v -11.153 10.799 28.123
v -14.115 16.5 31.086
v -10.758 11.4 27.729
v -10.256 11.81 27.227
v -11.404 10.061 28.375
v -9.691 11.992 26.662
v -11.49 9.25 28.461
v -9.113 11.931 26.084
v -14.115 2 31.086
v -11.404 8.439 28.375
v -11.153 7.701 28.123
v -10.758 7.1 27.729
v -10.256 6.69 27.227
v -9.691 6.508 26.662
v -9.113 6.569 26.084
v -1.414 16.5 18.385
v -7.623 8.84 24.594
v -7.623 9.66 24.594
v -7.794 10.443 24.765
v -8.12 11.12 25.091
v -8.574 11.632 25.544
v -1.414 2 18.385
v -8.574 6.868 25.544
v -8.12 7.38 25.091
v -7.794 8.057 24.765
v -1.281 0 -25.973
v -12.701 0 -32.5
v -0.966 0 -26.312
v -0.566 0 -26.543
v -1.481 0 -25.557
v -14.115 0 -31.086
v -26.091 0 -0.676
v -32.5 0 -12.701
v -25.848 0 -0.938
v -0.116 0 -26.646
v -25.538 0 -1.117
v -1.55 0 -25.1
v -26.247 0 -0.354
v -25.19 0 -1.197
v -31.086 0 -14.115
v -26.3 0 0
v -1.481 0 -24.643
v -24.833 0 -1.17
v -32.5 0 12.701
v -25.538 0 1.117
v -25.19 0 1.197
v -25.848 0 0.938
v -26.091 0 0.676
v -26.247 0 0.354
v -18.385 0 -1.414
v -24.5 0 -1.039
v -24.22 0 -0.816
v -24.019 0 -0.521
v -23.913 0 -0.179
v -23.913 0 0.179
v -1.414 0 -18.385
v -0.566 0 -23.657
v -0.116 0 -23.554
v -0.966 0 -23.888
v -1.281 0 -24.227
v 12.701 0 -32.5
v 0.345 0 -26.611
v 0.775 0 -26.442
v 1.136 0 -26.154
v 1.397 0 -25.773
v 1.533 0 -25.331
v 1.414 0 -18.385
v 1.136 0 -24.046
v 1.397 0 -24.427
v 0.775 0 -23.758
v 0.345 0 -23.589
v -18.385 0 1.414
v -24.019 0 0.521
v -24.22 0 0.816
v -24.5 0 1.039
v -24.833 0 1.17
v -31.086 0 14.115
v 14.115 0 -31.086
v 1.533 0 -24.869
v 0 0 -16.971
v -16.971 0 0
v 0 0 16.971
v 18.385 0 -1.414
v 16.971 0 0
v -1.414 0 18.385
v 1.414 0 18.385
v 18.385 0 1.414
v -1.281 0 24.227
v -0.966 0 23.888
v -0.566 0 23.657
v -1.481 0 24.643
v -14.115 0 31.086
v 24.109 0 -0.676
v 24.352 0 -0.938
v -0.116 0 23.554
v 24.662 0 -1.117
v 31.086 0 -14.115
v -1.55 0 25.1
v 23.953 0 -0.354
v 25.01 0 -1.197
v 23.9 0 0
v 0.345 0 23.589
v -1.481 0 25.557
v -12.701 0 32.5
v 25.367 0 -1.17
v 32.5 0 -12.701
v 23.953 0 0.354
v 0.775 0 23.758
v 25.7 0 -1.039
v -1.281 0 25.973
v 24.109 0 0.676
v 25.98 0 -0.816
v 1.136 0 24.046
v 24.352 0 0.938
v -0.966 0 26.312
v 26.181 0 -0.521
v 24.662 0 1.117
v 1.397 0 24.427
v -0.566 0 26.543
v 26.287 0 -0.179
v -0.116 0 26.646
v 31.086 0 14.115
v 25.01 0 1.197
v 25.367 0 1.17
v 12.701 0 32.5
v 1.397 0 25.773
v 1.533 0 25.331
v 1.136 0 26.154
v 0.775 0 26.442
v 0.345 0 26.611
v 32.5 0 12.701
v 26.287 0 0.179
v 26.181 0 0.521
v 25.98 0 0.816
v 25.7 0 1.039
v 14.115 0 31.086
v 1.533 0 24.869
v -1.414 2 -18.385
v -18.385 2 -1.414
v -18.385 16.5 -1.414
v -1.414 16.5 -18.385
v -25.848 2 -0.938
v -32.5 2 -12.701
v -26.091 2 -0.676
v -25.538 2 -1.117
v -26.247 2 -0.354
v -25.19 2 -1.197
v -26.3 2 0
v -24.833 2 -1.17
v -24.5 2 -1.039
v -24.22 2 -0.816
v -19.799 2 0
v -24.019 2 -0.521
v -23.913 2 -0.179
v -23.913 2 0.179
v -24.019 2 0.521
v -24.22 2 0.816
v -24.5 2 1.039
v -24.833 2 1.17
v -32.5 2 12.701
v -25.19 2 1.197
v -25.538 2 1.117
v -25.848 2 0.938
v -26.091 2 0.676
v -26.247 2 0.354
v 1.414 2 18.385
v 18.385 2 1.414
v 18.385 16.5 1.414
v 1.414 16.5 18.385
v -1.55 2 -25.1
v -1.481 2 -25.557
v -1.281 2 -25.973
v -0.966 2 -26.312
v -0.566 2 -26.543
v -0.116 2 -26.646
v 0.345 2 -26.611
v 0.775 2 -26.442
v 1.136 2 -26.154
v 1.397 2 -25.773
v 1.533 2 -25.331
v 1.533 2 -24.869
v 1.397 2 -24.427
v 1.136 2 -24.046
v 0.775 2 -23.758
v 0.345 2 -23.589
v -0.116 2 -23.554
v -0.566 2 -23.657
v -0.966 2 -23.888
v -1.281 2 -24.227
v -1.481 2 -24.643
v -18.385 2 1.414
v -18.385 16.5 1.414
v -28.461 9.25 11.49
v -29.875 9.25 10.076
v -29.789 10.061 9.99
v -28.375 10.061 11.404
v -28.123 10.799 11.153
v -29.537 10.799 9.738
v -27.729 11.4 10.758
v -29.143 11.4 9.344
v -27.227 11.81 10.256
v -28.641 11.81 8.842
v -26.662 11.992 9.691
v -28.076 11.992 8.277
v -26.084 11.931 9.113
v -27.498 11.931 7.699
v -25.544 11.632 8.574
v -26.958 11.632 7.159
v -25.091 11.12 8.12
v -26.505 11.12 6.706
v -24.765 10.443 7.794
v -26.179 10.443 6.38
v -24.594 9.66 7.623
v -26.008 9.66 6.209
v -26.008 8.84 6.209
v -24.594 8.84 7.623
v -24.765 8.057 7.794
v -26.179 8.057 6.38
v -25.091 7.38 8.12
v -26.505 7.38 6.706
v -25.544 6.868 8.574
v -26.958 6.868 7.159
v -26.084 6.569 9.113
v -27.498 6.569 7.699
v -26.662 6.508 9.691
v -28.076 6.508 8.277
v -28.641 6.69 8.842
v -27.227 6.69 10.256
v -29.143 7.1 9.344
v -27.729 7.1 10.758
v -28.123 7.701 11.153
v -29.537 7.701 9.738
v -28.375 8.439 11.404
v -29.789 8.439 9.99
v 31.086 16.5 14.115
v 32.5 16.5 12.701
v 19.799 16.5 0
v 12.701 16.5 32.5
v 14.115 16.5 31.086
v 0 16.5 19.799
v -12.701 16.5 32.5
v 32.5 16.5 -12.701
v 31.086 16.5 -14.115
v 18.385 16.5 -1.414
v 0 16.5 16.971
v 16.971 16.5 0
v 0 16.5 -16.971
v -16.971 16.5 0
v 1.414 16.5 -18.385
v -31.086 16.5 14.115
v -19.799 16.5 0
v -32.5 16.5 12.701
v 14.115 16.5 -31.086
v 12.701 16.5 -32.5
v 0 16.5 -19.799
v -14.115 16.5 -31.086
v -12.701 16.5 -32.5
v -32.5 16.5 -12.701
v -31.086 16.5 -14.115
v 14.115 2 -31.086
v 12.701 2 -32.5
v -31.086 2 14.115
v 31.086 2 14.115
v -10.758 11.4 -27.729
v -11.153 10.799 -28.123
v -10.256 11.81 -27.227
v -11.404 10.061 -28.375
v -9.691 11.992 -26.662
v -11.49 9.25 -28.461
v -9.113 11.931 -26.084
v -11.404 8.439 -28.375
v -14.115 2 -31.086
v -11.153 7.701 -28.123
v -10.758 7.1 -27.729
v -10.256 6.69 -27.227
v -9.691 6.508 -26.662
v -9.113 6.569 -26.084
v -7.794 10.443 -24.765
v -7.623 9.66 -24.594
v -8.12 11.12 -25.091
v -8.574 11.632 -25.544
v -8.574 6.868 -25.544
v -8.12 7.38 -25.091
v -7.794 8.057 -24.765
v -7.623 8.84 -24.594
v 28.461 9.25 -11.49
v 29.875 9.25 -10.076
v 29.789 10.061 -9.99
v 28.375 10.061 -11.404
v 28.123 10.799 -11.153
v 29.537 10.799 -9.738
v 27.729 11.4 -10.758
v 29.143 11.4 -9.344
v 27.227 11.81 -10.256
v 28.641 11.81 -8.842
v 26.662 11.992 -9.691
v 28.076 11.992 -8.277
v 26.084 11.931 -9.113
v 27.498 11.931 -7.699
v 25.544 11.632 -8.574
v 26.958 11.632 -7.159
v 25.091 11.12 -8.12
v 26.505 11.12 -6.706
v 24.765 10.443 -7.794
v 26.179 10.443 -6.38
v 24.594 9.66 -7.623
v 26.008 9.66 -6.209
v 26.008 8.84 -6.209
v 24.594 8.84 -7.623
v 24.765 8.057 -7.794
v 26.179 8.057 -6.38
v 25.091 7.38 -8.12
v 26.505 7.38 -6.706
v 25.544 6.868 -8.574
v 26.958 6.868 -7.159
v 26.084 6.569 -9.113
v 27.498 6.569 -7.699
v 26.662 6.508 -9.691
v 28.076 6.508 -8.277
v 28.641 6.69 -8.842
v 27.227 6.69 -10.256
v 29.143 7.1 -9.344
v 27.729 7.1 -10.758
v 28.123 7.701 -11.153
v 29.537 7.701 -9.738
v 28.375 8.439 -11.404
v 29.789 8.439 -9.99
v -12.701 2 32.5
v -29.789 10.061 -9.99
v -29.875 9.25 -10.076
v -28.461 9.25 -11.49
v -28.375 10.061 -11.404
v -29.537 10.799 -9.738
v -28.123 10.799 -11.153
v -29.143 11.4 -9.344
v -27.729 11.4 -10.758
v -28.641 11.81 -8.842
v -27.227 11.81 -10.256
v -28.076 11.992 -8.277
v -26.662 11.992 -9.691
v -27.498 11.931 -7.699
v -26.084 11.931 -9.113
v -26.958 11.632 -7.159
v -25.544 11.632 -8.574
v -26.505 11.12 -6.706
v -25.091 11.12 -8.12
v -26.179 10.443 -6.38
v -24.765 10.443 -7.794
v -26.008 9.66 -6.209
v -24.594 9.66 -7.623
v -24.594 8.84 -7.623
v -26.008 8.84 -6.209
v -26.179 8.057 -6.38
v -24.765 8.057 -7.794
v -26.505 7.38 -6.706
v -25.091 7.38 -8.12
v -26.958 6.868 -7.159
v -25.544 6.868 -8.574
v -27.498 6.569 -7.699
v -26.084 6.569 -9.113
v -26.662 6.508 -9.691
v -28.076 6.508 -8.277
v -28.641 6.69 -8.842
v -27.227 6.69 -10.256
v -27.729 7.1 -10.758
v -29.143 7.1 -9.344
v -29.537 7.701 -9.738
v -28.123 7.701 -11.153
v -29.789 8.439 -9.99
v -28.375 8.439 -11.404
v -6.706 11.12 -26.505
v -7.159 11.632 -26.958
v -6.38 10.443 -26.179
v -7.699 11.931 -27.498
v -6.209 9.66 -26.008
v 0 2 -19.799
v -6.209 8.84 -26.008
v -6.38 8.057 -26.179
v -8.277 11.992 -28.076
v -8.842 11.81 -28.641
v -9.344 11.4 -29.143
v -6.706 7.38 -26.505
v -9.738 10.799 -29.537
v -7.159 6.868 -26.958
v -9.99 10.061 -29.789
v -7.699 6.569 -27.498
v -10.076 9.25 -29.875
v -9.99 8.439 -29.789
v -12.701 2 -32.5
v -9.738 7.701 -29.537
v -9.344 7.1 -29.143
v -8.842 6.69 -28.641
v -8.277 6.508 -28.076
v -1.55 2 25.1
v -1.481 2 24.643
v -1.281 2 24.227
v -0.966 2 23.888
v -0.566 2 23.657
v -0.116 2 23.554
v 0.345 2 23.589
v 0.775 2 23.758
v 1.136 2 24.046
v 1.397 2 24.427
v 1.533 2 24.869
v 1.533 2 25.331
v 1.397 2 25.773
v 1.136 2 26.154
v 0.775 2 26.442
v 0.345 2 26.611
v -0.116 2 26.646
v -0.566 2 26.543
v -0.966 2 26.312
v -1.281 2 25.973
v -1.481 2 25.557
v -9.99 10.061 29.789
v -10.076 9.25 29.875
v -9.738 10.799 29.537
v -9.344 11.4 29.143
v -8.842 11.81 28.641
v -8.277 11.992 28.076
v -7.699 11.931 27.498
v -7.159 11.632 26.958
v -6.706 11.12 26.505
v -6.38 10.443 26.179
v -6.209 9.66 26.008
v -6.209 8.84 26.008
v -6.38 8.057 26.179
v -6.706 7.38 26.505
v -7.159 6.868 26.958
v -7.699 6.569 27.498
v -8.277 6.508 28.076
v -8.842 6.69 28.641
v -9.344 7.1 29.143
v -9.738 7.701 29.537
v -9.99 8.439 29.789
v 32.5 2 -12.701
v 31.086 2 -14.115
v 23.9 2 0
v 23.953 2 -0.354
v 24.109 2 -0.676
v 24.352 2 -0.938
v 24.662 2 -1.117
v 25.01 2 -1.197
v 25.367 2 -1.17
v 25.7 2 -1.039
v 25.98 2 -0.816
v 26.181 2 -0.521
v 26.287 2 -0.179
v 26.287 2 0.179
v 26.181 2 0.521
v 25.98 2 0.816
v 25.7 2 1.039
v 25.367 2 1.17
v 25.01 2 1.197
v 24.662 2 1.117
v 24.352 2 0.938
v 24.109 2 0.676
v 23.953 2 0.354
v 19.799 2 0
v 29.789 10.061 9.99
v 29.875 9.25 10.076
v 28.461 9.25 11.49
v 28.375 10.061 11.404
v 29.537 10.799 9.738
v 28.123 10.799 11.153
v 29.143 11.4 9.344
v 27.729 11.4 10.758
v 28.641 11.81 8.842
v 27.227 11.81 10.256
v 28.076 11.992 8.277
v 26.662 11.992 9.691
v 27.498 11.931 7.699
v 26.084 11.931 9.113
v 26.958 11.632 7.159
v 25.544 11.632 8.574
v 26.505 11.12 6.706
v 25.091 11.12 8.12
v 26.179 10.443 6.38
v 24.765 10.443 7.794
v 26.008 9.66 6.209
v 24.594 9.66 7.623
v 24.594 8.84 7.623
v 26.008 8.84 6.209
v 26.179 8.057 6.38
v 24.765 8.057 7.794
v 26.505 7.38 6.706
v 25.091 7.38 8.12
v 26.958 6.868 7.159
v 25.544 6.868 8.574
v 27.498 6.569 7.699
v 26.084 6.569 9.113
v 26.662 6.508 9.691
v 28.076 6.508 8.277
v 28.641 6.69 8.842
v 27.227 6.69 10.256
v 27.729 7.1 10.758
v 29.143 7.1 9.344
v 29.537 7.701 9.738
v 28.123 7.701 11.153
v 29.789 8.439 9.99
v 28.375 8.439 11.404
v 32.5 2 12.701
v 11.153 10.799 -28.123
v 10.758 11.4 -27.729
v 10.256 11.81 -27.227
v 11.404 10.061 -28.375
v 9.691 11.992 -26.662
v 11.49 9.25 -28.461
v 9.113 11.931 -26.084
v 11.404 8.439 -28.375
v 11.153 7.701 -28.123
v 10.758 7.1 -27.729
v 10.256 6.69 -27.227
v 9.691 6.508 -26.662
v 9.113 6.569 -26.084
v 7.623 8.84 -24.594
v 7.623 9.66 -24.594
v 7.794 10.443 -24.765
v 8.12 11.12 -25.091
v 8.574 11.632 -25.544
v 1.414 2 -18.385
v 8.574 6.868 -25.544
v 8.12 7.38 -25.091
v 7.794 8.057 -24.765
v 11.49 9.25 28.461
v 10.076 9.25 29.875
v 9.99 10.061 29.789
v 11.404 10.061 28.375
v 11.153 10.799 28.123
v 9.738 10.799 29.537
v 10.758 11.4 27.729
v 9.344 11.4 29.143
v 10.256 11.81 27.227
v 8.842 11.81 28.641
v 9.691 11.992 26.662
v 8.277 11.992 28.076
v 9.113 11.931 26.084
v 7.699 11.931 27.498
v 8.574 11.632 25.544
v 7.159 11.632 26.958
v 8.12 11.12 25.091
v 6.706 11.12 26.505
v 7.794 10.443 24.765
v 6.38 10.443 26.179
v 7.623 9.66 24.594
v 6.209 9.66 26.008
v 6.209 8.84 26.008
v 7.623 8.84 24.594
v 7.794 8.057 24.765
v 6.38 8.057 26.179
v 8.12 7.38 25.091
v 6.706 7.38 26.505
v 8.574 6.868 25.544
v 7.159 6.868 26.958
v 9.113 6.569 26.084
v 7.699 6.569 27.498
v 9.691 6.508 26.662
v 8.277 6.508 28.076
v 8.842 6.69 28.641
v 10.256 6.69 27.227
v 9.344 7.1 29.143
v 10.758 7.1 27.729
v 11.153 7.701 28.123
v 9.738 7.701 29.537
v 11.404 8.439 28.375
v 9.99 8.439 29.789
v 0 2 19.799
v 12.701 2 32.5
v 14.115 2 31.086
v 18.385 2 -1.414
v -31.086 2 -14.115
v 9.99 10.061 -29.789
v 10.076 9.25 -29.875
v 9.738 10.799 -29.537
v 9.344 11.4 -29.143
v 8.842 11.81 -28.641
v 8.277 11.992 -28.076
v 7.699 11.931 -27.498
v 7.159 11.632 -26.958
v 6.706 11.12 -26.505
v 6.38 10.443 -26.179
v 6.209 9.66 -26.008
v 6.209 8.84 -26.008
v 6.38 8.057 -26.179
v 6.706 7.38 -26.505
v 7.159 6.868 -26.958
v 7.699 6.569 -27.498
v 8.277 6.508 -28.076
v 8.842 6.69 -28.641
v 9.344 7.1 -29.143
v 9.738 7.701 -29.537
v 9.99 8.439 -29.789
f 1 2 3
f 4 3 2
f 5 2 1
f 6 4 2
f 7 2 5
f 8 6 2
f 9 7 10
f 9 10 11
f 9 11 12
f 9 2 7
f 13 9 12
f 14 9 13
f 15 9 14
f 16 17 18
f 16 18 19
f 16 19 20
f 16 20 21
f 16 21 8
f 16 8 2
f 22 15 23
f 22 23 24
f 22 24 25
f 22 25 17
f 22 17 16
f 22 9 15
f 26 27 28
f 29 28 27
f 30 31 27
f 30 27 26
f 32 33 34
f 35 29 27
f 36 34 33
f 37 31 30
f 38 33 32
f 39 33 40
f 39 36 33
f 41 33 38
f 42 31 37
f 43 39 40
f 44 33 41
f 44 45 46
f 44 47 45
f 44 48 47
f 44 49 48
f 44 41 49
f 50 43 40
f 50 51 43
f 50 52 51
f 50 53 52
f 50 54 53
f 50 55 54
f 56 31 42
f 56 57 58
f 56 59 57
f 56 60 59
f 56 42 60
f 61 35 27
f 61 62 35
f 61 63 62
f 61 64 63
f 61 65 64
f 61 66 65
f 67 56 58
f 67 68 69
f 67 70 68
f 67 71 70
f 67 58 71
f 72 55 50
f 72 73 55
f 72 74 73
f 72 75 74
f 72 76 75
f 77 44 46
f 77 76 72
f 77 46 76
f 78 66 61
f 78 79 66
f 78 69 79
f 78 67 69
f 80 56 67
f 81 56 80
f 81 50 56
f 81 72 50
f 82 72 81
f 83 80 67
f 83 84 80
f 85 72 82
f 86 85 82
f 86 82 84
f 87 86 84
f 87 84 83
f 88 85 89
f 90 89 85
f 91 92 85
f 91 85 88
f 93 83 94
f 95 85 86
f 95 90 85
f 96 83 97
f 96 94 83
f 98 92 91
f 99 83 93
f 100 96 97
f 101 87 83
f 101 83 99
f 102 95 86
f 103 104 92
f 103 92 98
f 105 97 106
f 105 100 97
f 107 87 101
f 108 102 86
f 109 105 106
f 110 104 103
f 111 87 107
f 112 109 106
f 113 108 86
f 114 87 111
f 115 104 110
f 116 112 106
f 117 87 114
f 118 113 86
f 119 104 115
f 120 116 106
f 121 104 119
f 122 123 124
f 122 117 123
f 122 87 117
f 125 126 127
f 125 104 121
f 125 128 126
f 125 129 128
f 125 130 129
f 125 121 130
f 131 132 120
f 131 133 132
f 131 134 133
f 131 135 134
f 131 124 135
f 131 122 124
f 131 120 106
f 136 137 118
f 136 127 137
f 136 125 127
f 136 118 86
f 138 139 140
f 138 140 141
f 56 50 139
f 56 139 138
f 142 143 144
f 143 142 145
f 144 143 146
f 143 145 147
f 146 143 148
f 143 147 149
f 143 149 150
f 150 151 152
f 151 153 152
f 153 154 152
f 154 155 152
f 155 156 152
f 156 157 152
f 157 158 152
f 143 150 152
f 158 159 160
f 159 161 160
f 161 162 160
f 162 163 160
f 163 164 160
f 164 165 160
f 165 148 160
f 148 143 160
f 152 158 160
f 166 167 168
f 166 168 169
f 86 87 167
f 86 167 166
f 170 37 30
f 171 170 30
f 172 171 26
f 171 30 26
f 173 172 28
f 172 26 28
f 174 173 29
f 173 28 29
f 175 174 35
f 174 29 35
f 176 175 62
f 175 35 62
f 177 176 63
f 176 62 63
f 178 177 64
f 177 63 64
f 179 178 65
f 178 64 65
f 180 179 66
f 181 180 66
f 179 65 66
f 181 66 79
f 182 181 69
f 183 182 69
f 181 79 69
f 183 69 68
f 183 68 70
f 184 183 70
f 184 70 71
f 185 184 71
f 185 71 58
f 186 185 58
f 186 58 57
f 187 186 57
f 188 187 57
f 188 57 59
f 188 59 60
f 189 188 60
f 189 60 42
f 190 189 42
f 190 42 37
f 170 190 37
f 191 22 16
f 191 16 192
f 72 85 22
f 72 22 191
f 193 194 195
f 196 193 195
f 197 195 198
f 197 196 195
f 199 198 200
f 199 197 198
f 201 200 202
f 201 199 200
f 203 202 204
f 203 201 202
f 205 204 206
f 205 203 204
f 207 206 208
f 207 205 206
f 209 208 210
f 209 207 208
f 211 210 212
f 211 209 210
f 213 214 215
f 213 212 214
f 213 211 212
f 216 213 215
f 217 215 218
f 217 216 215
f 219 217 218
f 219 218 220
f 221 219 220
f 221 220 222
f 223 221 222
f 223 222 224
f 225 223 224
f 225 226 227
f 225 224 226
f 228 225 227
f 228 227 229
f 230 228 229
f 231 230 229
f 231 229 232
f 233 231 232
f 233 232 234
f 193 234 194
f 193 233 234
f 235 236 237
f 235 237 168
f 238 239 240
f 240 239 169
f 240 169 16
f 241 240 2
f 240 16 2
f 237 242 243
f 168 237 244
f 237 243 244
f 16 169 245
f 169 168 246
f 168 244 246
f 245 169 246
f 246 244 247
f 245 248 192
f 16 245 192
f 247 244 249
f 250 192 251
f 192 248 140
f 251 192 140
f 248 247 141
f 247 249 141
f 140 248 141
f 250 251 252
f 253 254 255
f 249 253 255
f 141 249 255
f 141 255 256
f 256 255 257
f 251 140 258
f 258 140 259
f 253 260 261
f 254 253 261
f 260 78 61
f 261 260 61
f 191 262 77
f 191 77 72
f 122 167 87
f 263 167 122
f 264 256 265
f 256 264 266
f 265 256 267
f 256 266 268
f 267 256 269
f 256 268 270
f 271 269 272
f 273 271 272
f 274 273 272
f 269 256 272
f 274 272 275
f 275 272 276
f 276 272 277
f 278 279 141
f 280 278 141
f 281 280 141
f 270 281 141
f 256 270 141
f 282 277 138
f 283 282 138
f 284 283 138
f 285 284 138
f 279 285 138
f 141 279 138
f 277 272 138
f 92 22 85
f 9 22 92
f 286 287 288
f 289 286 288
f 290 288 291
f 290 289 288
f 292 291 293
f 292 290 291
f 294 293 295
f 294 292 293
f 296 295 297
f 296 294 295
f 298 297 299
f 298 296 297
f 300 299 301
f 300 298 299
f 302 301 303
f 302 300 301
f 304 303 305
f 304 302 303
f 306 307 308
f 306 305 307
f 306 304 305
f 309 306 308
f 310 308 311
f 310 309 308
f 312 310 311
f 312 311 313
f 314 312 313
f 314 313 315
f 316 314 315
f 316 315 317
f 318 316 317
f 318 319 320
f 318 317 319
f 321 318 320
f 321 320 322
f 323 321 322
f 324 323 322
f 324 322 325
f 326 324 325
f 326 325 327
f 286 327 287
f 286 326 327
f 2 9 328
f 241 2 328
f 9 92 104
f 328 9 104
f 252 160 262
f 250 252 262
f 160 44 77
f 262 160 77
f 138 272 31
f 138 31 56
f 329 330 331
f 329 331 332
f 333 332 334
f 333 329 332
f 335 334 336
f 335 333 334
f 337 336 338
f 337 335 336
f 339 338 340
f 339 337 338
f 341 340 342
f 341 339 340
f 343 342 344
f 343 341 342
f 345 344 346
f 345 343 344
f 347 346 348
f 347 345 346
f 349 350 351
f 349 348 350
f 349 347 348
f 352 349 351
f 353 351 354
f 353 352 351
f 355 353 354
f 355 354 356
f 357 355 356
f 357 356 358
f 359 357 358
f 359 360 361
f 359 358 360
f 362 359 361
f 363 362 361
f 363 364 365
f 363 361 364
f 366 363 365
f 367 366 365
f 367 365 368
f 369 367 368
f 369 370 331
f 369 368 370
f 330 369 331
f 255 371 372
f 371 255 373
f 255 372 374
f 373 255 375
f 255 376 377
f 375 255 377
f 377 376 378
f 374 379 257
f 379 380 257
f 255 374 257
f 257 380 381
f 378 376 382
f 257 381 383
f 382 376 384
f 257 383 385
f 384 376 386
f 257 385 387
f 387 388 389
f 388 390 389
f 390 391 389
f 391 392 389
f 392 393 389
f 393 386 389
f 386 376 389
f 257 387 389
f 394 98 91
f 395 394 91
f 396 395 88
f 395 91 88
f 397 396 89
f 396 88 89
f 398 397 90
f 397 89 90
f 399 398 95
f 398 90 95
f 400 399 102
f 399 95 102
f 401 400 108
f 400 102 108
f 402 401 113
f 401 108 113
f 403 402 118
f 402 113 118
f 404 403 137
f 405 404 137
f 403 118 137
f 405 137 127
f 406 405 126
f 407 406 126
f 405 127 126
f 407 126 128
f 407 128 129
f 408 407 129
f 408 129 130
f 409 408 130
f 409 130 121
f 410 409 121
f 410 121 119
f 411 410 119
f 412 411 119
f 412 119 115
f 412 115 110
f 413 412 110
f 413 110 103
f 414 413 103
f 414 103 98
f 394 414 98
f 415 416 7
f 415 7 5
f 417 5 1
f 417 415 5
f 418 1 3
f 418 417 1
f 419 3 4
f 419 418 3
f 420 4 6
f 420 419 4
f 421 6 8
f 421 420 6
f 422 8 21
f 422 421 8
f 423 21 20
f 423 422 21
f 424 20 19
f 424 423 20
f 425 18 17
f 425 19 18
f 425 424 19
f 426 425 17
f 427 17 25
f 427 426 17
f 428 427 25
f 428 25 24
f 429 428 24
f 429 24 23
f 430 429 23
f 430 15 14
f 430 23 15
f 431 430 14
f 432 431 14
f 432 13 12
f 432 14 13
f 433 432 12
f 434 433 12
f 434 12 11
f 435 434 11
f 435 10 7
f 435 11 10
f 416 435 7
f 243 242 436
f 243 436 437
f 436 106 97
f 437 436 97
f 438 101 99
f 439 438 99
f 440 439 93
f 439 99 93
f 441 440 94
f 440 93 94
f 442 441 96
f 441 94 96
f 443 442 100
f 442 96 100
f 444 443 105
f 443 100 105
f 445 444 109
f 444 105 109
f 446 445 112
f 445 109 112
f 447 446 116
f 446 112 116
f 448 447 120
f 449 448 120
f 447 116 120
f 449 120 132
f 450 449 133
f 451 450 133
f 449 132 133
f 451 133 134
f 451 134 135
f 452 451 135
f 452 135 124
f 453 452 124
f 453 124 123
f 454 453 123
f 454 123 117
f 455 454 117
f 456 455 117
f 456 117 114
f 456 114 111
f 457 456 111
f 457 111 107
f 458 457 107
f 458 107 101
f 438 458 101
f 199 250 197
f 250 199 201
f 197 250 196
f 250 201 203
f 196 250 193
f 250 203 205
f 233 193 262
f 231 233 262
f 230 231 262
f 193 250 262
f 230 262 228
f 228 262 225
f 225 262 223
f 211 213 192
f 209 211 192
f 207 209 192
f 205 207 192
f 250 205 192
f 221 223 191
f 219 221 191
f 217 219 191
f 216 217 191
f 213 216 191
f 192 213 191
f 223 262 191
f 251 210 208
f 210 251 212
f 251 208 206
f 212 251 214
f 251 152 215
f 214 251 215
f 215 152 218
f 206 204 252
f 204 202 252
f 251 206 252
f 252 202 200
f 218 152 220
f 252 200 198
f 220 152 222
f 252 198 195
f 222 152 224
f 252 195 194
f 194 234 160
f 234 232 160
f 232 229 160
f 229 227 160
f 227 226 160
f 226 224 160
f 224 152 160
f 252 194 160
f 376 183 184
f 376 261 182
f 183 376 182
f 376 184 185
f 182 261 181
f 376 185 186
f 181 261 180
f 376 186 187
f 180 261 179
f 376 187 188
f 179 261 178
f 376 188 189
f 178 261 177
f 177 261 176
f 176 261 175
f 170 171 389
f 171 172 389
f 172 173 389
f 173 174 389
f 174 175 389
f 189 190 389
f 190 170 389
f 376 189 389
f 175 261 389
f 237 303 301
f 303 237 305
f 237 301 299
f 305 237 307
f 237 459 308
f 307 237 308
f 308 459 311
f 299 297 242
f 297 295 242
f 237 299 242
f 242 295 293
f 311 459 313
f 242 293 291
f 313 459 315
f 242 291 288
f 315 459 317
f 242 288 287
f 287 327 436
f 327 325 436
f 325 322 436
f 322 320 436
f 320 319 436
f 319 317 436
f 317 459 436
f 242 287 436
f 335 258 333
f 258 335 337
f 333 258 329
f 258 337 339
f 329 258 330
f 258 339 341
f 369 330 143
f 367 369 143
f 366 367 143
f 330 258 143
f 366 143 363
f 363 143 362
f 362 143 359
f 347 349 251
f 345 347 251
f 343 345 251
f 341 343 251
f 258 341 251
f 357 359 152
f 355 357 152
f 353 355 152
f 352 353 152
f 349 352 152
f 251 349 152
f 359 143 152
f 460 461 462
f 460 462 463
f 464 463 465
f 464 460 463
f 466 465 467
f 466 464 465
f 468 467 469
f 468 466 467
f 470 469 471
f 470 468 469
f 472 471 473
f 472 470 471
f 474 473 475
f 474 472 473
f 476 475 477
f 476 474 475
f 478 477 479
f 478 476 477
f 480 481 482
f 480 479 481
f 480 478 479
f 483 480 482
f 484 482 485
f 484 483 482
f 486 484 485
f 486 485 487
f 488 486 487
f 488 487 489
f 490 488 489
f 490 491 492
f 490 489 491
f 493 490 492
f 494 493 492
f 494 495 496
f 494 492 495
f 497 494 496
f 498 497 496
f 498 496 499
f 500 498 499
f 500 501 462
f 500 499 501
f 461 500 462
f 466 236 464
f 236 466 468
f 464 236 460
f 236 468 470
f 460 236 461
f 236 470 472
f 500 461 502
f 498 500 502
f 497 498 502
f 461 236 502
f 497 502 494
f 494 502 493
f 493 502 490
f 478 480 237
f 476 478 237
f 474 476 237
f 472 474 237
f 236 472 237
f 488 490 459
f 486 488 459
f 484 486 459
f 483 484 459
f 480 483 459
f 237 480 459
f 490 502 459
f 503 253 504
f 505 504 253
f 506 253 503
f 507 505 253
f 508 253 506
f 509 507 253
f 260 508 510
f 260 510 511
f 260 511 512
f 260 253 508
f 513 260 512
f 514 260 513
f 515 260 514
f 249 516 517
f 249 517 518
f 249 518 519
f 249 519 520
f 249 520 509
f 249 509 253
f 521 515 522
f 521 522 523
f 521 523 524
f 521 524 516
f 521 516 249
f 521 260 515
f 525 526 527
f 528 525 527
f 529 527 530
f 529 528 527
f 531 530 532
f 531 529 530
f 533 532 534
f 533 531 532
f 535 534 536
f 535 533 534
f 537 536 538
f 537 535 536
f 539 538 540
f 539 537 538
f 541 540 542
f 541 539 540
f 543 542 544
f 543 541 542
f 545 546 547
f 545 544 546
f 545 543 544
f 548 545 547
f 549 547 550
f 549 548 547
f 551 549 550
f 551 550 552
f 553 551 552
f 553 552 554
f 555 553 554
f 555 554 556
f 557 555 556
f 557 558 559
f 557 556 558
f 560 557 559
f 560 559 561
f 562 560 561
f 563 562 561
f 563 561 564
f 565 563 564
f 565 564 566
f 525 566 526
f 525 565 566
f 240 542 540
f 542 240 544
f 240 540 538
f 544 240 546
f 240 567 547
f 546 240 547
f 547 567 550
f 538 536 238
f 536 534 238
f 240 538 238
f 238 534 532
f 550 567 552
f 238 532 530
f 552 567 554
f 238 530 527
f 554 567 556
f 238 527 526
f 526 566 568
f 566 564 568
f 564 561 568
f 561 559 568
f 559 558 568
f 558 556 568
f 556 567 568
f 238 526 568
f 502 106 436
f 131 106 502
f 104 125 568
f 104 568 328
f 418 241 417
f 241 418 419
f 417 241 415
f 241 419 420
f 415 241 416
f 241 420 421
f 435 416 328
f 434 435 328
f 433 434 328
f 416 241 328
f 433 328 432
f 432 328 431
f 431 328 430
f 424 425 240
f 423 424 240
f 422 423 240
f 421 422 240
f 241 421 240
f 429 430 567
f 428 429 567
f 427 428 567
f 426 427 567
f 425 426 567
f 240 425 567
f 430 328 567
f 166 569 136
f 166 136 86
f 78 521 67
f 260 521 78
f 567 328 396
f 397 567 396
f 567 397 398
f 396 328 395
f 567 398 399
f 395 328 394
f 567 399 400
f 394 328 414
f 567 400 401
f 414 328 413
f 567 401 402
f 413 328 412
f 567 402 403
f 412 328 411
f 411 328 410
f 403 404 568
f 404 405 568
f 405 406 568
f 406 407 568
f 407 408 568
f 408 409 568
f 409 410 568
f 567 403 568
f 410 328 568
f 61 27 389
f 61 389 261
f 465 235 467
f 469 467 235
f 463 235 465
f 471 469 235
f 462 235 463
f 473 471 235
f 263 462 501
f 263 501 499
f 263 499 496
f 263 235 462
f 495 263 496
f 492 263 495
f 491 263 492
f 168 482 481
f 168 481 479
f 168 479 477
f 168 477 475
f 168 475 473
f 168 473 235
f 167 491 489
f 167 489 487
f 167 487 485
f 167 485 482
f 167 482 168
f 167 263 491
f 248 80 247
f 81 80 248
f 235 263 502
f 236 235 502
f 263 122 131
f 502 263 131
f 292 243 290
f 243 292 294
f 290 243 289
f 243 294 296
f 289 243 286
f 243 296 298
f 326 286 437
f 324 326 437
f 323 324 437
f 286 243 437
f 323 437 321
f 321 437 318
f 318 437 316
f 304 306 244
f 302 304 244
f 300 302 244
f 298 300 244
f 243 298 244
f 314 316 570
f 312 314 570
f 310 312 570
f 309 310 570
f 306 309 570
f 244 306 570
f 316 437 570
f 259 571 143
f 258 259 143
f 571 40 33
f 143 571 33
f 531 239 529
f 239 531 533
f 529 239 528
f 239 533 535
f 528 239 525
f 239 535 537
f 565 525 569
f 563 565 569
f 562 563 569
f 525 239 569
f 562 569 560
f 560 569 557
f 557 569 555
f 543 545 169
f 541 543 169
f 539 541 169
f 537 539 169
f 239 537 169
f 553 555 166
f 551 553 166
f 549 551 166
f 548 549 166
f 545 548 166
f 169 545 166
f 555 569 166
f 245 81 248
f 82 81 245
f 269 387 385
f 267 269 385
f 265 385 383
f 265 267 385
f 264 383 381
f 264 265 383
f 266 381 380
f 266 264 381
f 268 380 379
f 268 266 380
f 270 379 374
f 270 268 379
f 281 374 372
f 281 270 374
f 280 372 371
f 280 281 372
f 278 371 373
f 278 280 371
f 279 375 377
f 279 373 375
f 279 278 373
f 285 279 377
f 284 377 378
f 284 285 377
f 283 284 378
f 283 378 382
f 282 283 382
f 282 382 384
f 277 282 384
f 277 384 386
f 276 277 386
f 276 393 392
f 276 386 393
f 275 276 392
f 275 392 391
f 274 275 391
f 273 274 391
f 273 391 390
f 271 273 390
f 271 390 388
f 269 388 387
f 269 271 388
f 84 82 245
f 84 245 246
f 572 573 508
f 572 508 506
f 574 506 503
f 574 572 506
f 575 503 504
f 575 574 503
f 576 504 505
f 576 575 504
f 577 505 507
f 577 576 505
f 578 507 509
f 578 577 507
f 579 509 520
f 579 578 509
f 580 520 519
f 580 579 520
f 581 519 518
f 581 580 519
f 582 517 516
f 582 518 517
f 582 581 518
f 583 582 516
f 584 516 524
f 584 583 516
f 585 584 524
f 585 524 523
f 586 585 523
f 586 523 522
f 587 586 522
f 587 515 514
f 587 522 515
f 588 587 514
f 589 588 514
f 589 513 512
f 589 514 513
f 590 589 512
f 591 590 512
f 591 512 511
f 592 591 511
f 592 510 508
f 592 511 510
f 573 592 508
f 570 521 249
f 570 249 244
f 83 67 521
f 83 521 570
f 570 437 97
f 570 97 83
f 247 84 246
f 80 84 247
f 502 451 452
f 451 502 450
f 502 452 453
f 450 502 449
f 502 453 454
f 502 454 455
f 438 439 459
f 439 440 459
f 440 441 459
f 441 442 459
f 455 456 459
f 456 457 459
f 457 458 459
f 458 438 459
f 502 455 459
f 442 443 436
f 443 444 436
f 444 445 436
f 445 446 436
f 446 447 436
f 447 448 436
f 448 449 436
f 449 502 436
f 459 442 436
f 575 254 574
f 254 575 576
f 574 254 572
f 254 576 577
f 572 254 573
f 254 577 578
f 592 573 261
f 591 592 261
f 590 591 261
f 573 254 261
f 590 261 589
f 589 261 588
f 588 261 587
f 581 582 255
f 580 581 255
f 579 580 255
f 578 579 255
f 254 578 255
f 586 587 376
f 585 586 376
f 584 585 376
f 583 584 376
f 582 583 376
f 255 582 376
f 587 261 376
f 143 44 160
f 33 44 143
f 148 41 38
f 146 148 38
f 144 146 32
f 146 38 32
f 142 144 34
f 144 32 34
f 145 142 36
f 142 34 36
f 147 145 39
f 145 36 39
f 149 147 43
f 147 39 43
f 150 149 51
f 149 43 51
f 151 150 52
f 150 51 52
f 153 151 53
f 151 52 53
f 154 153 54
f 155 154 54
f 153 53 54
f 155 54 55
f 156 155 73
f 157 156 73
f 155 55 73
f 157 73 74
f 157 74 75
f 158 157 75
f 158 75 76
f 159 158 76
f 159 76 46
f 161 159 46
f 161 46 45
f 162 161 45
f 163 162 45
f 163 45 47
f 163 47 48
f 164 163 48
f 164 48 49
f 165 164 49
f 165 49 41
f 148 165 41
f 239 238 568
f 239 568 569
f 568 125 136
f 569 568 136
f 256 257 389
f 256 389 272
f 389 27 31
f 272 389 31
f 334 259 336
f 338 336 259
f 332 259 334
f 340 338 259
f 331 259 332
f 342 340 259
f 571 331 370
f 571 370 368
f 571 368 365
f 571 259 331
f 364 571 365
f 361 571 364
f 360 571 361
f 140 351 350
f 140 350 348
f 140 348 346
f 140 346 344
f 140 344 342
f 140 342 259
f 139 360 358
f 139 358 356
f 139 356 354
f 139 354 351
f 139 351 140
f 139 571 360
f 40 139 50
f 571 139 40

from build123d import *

# Parameters (mm, degrees)
GENERAL_SHAPE_DEPTH             = 2
RETAINING_WALLS_DEPTH           = 14.5
EXTERIOR_MOUNTING_EDGE_DEPTH    = 2
REAR_WALL_DEPTH                 = 14.5
CUT_EXTRUDE2_DEPTH              = 51.801082666
CUT_EXTRUDE2_DEPTH_BACK         = 51.801082666
SKETCH35_R                      = 2.75
CIRPATTERN2_COUNT               = 4
EXTERIOR_MOUNTING_HOLE_D        = 2.4
SHOULDER_SCREW_MOUNTING_HOLES_D = 3.1
CUT_EXTRUDE1_REACH              = 50.195


with BuildPart() as part:
    # Sketch3 → General shape (new body)
    with BuildSketch(Plane(origin=(0, 0, 0), x_dir=(1, 0, 0), z_dir=(0, 1, 0))):
        Polygon((-32.5, -12.701010127), (-12.701010127, -32.5), (0, -19.798989873), (0, 0), (-19.798989873, 0), align=None)
    extrude(amount=GENERAL_SHAPE_DEPTH)

    # Sketch4 → Retaining walls (add)
    with BuildSketch(Plane(origin=(0, 2, 0), x_dir=(1, 0, 0), z_dir=(0, 1, 0))):
        Polygon((-19.798989873, 0), (-32.5, -12.701010127), (-31.085786438, -14.115223689), (-16.970562748, 0), align=None)
        Polygon((-14.115223689, -31.085786438), (0, -16.970562748), (0, -19.798989873), (-12.701010127, -32.5), align=None)
    extrude(amount=RETAINING_WALLS_DEPTH)

    # Sketch14 → Exterior mounting edge (add)
    with BuildSketch(Plane.XZ):
        Polygon((-19.798989873, 0), (-32.5, 12.701010127), (-32.5, 0), align=None)
        Polygon((0, 19.798989873), (0, 32.5), (-12.701010127, 32.5), align=None)
    extrude(amount=-EXTERIOR_MOUNTING_EDGE_DEPTH)

    # Sketch18 → Rear wall (add)
    with BuildSketch(Plane(origin=(0, 2, 0), x_dir=(1, 0, 0), z_dir=(0, 1, 0))):
        Polygon((-16.970562748, 0), (0, -16.970562748), (-1.414213562, -18.384776311), (-18.384776311, -1.414213562), align=None)
    extrude(amount=REAR_WALL_DEPTH)

    # Sketch35 → Cut-Extrude2 (cut, two sides: drawn at the far end of the back side and taken through both)
    with BuildSketch(Plane(origin=(-9.899494937, 0, -9.899494937), x_dir=(-0.7071067811865475, 0, 0.7071067811865477), z_dir=(-0.7071067811865477, 0, -0.7071067811865475)).offset(-CUT_EXTRUDE2_DEPTH_BACK)):
        with Locations((25.5, 9.25)):
            Circle(SKETCH35_R)
    extrude(amount=CUT_EXTRUDE2_DEPTH + CUT_EXTRUDE2_DEPTH_BACK, mode=Mode.SUBTRACT)


with BuildPart() as cirpattern2_1:
    # CirPattern2: pattern copy
    add(part.part.rotate(Axis((0, 0, 0), (0, 1, 0)), 1 * 360 / CIRPATTERN2_COUNT))


with BuildPart() as cirpattern2_2:
    # CirPattern2: pattern copy
    add(part.part.rotate(Axis((0, 0, 0), (0, 1, 0)), 2 * 360 / CIRPATTERN2_COUNT))


with BuildPart() as cirpattern2_3:
    # CirPattern2: pattern copy
    add(part.part.rotate(Axis((0, 0, 0), (0, 1, 0)), 3 * 360 / CIRPATTERN2_COUNT))

    # Combine1: union CirPattern2_1, CirPattern2_2, part
    add(cirpattern2_1.part)
    add(cirpattern2_2.part)
    add(part.part)

    # Exterior mounting hole (through all)
    with Locations(Plane(origin=(0, 2, 0), x_dir=(1, 0, 0), z_dir=(0, 1, 0))):
        with Locations((-25.1, 0), (25.1, 0)):
            Hole(EXTERIOR_MOUNTING_HOLE_D / 2)

    # Shoulder screw mounting holes (through all)
    with Locations(Plane(origin=(0, 2, 0), x_dir=(1, 0, 0), z_dir=(0, 1, 0))):
        with Locations((0, -25.1), (0, 25.1)):
            Hole(SHOULDER_SCREW_MOUNTING_HOLES_D / 2)

    # Sketch23 → Cut-Extrude1 (cut, up to next)
    with BuildSketch(Plane(origin=(0, 2, 0), x_dir=(1, 0, 0), z_dir=(0, 1, 0)), mode=Mode.PRIVATE) as cut_extrude1_sk1:
        Polygon((0, 16.970562748), (-16.970562748, 0), (0, -16.970562748), (16.970562748, 0), align=None)
    cut_extrude1_tool1 = extrude(cut_extrude1_sk1.sketch, amount=-CUT_EXTRUDE1_REACH, mode=Mode.PRIVATE) & cirpattern2_3.part
    # Sketch23 → Cut-Extrude1 (cut, up to next)
    with BuildSketch(Plane(origin=(0, 2, 0), x_dir=(1, 0, 0), z_dir=(0, 1, 0)), mode=Mode.PRIVATE) as cut_extrude1_sk2:
        Polygon((31.085786438, 14.115223689), (18.384776311, 1.414213562), (1.414213562, 18.384776311), (14.115223689, 31.085786438), align=None)
    cut_extrude1_tool2 = extrude(cut_extrude1_sk2.sketch, amount=-CUT_EXTRUDE1_REACH, mode=Mode.PRIVATE) & cirpattern2_3.part
    # Sketch23 → Cut-Extrude1 (cut, up to next)
    with BuildSketch(Plane(origin=(0, 2, 0), x_dir=(1, 0, 0), z_dir=(0, 1, 0)), mode=Mode.PRIVATE) as cut_extrude1_sk3:
        Polygon((-18.384776311, 1.414213562), (-31.085786438, 14.115223689), (-14.115223689, 31.085786438), (-1.414213562, 18.384776311), align=None)
    cut_extrude1_tool3 = extrude(cut_extrude1_sk3.sketch, amount=-CUT_EXTRUDE1_REACH, mode=Mode.PRIVATE) & cirpattern2_3.part
    # Sketch23 → Cut-Extrude1 (cut, up to next)
    with BuildSketch(Plane(origin=(0, 2, 0), x_dir=(1, 0, 0), z_dir=(0, 1, 0)), mode=Mode.PRIVATE) as cut_extrude1_sk4:
        Polygon((-1.414213562, -18.384776311), (-14.115223689, -31.085786438), (-31.085786438, -14.115223689), (-18.384776311, -1.414213562), align=None)
    cut_extrude1_tool4 = extrude(cut_extrude1_sk4.sketch, amount=-CUT_EXTRUDE1_REACH, mode=Mode.PRIVATE) & cirpattern2_3.part
    # Sketch23 → Cut-Extrude1 (cut, up to next)
    with BuildSketch(Plane(origin=(0, 2, 0), x_dir=(1, 0, 0), z_dir=(0, 1, 0)), mode=Mode.PRIVATE) as cut_extrude1_sk5:
        Polygon((14.115223689, -31.085786438), (1.414213562, -18.384776311), (18.384776311, -1.414213562), (31.085786438, -14.115223689), align=None)
    cut_extrude1_tool5 = extrude(cut_extrude1_sk5.sketch, amount=-CUT_EXTRUDE1_REACH, mode=Mode.PRIVATE) & cirpattern2_3.part
    add(cut_extrude1_tool1.solids().sort_by_distance((0, 2, 0))[0], mode=Mode.SUBTRACT)
    add(cut_extrude1_tool2.solids().sort_by_distance((16.25, 2, -16.25))[0], mode=Mode.SUBTRACT)
    add(cut_extrude1_tool3.solids().sort_by_distance((-16.25, 2, -16.25))[0], mode=Mode.SUBTRACT)
    add(cut_extrude1_tool4.solids().sort_by_distance((-16.25, 2, 16.25))[0], mode=Mode.SUBTRACT)
    add(cut_extrude1_tool5.solids().sort_by_distance((16.25, 2, 16.25))[0], mode=Mode.SUBTRACT)


solid = cirpattern2_3.part
